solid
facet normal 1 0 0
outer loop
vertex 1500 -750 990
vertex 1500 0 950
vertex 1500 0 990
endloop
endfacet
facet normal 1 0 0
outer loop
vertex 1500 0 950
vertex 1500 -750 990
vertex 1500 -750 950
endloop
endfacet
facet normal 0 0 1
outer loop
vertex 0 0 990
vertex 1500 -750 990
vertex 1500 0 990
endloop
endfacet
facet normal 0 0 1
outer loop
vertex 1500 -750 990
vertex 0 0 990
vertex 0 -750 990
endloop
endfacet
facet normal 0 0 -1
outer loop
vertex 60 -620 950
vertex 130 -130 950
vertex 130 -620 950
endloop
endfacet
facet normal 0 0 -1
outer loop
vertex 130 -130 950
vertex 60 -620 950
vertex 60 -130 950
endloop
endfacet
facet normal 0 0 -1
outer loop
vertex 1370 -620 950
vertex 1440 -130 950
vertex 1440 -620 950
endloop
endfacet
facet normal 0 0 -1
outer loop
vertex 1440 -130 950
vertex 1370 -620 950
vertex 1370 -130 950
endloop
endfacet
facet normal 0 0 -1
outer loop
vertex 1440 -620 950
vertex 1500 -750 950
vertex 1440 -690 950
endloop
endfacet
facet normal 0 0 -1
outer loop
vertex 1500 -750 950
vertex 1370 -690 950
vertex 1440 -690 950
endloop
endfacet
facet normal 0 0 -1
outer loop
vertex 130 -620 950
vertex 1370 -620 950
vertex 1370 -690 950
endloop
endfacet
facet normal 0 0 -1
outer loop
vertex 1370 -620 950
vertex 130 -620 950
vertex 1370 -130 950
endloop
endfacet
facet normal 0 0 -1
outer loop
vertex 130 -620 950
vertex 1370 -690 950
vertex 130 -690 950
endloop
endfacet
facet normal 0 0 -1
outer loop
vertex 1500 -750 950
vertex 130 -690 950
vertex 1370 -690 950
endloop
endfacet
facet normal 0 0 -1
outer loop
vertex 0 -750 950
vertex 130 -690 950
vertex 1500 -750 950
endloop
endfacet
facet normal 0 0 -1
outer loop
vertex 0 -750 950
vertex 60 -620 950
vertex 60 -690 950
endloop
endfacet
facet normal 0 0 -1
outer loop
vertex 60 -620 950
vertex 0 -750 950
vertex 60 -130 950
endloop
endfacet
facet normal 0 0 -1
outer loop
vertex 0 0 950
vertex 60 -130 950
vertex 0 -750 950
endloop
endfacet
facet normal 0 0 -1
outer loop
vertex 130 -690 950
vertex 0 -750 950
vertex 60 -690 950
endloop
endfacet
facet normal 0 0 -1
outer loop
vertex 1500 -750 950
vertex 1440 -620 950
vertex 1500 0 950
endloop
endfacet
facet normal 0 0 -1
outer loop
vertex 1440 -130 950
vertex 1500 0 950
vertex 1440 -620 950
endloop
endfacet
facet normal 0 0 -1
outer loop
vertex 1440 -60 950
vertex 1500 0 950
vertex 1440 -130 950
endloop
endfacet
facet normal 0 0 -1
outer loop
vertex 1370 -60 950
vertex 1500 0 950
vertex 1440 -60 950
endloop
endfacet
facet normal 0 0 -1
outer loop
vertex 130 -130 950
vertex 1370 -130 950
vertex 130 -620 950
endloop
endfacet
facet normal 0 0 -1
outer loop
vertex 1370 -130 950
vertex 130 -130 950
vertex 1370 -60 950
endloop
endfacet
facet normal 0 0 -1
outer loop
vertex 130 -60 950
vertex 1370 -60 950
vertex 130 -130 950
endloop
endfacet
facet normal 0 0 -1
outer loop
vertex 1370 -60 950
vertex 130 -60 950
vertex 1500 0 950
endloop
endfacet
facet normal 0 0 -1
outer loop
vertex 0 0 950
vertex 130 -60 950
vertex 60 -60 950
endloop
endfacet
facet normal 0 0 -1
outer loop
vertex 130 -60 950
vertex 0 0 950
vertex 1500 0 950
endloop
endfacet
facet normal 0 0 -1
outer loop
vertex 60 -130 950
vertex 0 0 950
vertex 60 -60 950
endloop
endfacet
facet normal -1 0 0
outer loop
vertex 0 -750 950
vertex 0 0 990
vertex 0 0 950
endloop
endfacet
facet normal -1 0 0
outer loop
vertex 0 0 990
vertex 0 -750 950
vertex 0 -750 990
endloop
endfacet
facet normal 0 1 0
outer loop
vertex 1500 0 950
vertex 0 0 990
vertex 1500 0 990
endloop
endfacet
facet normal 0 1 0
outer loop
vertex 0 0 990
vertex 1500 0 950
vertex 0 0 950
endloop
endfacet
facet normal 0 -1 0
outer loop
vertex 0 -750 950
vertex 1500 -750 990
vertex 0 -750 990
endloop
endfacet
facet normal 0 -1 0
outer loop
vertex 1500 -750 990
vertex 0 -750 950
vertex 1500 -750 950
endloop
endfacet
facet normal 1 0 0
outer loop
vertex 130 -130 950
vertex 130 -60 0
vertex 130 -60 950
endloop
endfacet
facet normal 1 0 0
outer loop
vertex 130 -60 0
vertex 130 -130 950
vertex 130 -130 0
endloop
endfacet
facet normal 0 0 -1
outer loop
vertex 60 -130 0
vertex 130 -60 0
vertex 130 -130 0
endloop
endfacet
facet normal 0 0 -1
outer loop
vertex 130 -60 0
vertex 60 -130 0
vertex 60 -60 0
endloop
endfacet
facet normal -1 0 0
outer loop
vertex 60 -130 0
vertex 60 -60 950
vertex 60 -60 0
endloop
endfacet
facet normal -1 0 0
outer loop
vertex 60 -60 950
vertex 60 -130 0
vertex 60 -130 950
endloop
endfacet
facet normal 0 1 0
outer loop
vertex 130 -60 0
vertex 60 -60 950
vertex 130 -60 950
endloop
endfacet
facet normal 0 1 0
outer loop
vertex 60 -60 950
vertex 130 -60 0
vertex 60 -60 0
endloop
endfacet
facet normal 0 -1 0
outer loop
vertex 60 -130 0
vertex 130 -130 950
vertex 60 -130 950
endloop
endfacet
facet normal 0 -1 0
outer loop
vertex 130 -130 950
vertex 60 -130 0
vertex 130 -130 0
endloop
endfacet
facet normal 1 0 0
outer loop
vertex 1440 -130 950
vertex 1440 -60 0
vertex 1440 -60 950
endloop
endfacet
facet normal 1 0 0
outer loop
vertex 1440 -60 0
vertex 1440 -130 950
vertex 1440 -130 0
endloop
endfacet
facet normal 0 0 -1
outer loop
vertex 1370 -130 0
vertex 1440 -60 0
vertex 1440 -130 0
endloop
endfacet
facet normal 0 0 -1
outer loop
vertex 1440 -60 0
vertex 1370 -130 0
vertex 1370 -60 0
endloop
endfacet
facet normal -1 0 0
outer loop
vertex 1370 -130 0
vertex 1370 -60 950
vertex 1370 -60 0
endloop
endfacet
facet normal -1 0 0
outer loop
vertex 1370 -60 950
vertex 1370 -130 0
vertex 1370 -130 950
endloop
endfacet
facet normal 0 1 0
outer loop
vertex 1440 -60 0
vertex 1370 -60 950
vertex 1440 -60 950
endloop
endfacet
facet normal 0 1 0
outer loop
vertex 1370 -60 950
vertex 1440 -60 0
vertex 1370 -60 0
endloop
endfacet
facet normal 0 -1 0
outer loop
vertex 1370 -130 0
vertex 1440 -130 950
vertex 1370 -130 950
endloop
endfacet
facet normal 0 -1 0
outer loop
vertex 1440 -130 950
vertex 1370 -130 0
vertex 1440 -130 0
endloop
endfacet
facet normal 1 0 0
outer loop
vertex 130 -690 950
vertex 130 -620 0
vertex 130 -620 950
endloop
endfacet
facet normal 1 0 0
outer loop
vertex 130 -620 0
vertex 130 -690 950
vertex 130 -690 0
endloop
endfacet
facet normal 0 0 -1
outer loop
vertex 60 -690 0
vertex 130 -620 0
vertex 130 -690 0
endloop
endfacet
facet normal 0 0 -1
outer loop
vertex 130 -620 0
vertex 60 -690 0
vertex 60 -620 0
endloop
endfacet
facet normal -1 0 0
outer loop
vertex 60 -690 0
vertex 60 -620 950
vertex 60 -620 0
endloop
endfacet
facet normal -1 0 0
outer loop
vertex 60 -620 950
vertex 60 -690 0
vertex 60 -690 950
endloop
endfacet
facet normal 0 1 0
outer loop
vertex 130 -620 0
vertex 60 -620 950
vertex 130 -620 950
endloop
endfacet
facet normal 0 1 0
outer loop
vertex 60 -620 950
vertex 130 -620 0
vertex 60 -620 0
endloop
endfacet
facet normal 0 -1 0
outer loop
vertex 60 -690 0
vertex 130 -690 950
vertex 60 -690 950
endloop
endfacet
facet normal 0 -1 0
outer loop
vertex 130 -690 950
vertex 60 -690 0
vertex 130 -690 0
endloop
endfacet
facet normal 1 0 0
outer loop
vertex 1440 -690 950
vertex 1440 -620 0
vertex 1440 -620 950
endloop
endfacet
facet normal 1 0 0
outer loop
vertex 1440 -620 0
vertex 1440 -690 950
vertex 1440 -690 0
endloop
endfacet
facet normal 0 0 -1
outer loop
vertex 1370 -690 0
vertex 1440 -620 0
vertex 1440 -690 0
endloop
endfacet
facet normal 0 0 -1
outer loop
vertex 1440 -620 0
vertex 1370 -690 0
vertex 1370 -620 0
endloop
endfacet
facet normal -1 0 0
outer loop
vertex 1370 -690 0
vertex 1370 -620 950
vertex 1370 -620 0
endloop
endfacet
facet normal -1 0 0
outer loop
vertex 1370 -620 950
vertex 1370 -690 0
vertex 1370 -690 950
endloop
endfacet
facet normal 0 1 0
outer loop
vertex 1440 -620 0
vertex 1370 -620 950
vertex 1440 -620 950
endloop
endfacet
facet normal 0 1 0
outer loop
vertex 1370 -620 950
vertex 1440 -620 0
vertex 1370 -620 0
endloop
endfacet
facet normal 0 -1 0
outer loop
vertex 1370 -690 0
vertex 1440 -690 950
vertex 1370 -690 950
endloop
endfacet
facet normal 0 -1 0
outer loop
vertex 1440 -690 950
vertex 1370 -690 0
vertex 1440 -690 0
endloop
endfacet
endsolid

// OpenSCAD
// file: ../components/workbench.scad
//
// Generic workbench component
//

module workbench(
    width,
    depth,
    height,
    top_thickness = 40,
    leg_size = 70,
    leg_inset = 60
) {
    top_z = height - top_thickness;
    leg_height = top_z;

    // Worktop
    translate([0, -depth, top_z])
        cube([width, depth, top_thickness]);

    // Rear left leg
    translate([
        leg_inset,
        -leg_size - leg_inset,
        0
    ])
        cube([leg_size, leg_size, leg_height]);

    // Rear right leg
    translate([
        width - leg_inset - leg_size,
        -leg_size - leg_inset,
        0
    ])
        cube([leg_size, leg_size, leg_height]);

    // Front left leg
    translate([
        leg_inset,
        -depth + leg_inset,
        0
    ])
        cube([leg_size, leg_size, leg_height]);

    // Front right leg
    translate([
        width - leg_inset - leg_size,
        -depth + leg_inset,
        0
    ])
        cube([leg_size, leg_size, leg_height]);
}
// file: ../project_components/garage_workbench.scad
//
// Project component: garage workbench derived from the generic workbench.
//

include <../components/workbench.scad>

module garage_workbench(
    x,
    width,
    depth,
    height,
    top_thickness,
    leg_size,
    leg_inset
) {
    translate([x, 0, 0])
        workbench(
            width         = width,
            depth         = depth,
            height        = height,
            top_thickness = top_thickness,
            leg_size      = leg_size,
            leg_inset     = leg_inset
        );
}
// file: ../config.scad
//
// Garage layout - configuration
// Units: millimetres
//

$fn = 48;


/* [View] */

show_rear_wall           = true;
show_left_wall           = true;
show_window_frame        = true;
show_door_frame          = true;
show_window_sill         = true;
show_workbench           = true;
show_floor               = true;
show_tool_backing_panels = true;
show_skadis_panels       = true;
show_tool_panel_mounts   = true;
show_skadis_slot_pattern = true;
show_skadis_mount_points = true;
show_skadis_mount_hardware = false;

// Move multiplex + SKADIS towards the garage to inspect the concealed mount.
tool_panel_explode = 0; // [0:5:150]


/* [Garage walls] */

wall_width     = 3800;
wall_height    = 2600;

// Concrete / structural inner shell only.
// Additional exterior wall layers can be added later.
wall_thickness = 90;

// Temporary left-wall depth follows the currently modelled floor depth.
// This will become the measured garage depth later.
left_wall_depth = 2000;


/* [Window opening] */

// Inside view: measured from the left side of the rear wall.
window_left_offset = 480;
window_width       = 780;
window_height      = 1340;
window_top_offset  = 200;

window_bottom = wall_height - window_top_offset - window_height;


/* [Window sill] */

// Projection into the garage from the inside face of the wall.
window_sill_thickness  = 20;
window_sill_depth      = 20;
window_sill_side_extra = 20;


/* [Door opening] */

// Horizontal distance between the right side of the window opening
// and the left side of the door opening.
window_to_door = 740;

// Width is provisional until measured.
door_width  = 900;
door_height = 2300;

door_left = window_left_offset + window_width + window_to_door;


/* [Exterior frames] */

// Simplified visualization. Both frames sit on the exterior side
// of the 90 mm concrete wall.
frame_border = 50;
frame_depth  = 60;


/* [Workbench] */

workbench_width  = 1500;
workbench_depth  = 750;
workbench_height = 990;

workbench_top_thickness = 40;
workbench_leg_size      = 70;
workbench_leg_inset     = 60;

// Inside view: workbench starts at the left end of the rear wall.
workbench_x = 0;


/* [Tool panel backing] */

// Use the 1220 mm sheet dimension directly. The backing panels are centred
// vertically on the window opening instead of being made as tall as the window.
tool_panel_height = 1220;
tool_panel_bottom = window_bottom + (window_height - tool_panel_height) / 2;
tool_panel_top    = tool_panel_bottom + tool_panel_height;

tool_panel_thickness = 18;

// Left wall strip is 480 mm; keep 10 mm free on each side.
left_tool_panel_width = 460;
left_tool_panel_x = (window_left_offset - left_tool_panel_width) / 2;

// Right wall strip between window and door is 740 mm; keep 10 mm each side.
right_tool_panel_width = 720;
right_tool_panel_x =
    window_left_offset + window_width
    + (window_to_door - right_tool_panel_width) / 2;


/* [SKADIS] */

skadis_width  = 360;
skadis_height = 560;
skadis_thickness = 5;

// Approximate stand-off created by the original IKEA wall rail/spacers.
skadis_mount_gap = 15;

// Geometry used for the recognisable SKADIS pattern.
skadis_corner_radius = 9;
skadis_slot_width    = 5;
skadis_slot_height   = 15;
skadis_grid_pitch    = 40;
skadis_grid_offset   = 20;

// The 36 cm board uses the supplied 20 cm wall rail. The four visible board
// fasteners are modelled at the corresponding left/right positions.
skadis_rail_length = 200;
skadis_mount_point_z_inset = 20;
skadis_mount_head_diameter = 12;
skadis_mount_head_depth = 2;


/* [Tool panel mounting - Ropro] */

// Ropro Heavy Duty French Cleat / Z-bar known dimensions.
cleat_profile_height = 38;
cleat_wall_distance  = 6;

// Route the full wall-rail envelope into the back of the 18 mm multiplex.
// This leaves 12 mm of multiplex below the recess and must be considered
// when selecting screws for the panel-side counter profile.
cleat_recess_depth = 6;
cleat_recess_clearance = 1;

// Position rail near the upper edge, safely above the panel centre of gravity.
cleat_top_inset = 50;

// Left panel: Ropro Heavy Duty 30 cm set (300 + 300 mm).
left_cleat_wall_length  = 300;
left_cleat_panel_length = 300;

// Right panel: Ropro Heavy Duty 60+6 cm set:
// 600 mm wall rail + two 60 mm panel-side counter profiles.
right_cleat_wall_length = 600;
right_cleat_panel_piece_length = 60;


/* [Floor] */

// Temporary depth until the complete garage depth is measured.
floor_depth     = 2000;
floor_thickness = 100;
// main file
// Export entry point: workbench only

include <../config.scad>
include <../project_components/garage_workbench.scad>

garage_workbench(
    x             = 0,
    width         = workbench_width,
    depth         = workbench_depth,
    height        = workbench_height,
    top_thickness = workbench_top_thickness,
    leg_size      = workbench_leg_size,
    leg_inset     = workbench_leg_inset
);
